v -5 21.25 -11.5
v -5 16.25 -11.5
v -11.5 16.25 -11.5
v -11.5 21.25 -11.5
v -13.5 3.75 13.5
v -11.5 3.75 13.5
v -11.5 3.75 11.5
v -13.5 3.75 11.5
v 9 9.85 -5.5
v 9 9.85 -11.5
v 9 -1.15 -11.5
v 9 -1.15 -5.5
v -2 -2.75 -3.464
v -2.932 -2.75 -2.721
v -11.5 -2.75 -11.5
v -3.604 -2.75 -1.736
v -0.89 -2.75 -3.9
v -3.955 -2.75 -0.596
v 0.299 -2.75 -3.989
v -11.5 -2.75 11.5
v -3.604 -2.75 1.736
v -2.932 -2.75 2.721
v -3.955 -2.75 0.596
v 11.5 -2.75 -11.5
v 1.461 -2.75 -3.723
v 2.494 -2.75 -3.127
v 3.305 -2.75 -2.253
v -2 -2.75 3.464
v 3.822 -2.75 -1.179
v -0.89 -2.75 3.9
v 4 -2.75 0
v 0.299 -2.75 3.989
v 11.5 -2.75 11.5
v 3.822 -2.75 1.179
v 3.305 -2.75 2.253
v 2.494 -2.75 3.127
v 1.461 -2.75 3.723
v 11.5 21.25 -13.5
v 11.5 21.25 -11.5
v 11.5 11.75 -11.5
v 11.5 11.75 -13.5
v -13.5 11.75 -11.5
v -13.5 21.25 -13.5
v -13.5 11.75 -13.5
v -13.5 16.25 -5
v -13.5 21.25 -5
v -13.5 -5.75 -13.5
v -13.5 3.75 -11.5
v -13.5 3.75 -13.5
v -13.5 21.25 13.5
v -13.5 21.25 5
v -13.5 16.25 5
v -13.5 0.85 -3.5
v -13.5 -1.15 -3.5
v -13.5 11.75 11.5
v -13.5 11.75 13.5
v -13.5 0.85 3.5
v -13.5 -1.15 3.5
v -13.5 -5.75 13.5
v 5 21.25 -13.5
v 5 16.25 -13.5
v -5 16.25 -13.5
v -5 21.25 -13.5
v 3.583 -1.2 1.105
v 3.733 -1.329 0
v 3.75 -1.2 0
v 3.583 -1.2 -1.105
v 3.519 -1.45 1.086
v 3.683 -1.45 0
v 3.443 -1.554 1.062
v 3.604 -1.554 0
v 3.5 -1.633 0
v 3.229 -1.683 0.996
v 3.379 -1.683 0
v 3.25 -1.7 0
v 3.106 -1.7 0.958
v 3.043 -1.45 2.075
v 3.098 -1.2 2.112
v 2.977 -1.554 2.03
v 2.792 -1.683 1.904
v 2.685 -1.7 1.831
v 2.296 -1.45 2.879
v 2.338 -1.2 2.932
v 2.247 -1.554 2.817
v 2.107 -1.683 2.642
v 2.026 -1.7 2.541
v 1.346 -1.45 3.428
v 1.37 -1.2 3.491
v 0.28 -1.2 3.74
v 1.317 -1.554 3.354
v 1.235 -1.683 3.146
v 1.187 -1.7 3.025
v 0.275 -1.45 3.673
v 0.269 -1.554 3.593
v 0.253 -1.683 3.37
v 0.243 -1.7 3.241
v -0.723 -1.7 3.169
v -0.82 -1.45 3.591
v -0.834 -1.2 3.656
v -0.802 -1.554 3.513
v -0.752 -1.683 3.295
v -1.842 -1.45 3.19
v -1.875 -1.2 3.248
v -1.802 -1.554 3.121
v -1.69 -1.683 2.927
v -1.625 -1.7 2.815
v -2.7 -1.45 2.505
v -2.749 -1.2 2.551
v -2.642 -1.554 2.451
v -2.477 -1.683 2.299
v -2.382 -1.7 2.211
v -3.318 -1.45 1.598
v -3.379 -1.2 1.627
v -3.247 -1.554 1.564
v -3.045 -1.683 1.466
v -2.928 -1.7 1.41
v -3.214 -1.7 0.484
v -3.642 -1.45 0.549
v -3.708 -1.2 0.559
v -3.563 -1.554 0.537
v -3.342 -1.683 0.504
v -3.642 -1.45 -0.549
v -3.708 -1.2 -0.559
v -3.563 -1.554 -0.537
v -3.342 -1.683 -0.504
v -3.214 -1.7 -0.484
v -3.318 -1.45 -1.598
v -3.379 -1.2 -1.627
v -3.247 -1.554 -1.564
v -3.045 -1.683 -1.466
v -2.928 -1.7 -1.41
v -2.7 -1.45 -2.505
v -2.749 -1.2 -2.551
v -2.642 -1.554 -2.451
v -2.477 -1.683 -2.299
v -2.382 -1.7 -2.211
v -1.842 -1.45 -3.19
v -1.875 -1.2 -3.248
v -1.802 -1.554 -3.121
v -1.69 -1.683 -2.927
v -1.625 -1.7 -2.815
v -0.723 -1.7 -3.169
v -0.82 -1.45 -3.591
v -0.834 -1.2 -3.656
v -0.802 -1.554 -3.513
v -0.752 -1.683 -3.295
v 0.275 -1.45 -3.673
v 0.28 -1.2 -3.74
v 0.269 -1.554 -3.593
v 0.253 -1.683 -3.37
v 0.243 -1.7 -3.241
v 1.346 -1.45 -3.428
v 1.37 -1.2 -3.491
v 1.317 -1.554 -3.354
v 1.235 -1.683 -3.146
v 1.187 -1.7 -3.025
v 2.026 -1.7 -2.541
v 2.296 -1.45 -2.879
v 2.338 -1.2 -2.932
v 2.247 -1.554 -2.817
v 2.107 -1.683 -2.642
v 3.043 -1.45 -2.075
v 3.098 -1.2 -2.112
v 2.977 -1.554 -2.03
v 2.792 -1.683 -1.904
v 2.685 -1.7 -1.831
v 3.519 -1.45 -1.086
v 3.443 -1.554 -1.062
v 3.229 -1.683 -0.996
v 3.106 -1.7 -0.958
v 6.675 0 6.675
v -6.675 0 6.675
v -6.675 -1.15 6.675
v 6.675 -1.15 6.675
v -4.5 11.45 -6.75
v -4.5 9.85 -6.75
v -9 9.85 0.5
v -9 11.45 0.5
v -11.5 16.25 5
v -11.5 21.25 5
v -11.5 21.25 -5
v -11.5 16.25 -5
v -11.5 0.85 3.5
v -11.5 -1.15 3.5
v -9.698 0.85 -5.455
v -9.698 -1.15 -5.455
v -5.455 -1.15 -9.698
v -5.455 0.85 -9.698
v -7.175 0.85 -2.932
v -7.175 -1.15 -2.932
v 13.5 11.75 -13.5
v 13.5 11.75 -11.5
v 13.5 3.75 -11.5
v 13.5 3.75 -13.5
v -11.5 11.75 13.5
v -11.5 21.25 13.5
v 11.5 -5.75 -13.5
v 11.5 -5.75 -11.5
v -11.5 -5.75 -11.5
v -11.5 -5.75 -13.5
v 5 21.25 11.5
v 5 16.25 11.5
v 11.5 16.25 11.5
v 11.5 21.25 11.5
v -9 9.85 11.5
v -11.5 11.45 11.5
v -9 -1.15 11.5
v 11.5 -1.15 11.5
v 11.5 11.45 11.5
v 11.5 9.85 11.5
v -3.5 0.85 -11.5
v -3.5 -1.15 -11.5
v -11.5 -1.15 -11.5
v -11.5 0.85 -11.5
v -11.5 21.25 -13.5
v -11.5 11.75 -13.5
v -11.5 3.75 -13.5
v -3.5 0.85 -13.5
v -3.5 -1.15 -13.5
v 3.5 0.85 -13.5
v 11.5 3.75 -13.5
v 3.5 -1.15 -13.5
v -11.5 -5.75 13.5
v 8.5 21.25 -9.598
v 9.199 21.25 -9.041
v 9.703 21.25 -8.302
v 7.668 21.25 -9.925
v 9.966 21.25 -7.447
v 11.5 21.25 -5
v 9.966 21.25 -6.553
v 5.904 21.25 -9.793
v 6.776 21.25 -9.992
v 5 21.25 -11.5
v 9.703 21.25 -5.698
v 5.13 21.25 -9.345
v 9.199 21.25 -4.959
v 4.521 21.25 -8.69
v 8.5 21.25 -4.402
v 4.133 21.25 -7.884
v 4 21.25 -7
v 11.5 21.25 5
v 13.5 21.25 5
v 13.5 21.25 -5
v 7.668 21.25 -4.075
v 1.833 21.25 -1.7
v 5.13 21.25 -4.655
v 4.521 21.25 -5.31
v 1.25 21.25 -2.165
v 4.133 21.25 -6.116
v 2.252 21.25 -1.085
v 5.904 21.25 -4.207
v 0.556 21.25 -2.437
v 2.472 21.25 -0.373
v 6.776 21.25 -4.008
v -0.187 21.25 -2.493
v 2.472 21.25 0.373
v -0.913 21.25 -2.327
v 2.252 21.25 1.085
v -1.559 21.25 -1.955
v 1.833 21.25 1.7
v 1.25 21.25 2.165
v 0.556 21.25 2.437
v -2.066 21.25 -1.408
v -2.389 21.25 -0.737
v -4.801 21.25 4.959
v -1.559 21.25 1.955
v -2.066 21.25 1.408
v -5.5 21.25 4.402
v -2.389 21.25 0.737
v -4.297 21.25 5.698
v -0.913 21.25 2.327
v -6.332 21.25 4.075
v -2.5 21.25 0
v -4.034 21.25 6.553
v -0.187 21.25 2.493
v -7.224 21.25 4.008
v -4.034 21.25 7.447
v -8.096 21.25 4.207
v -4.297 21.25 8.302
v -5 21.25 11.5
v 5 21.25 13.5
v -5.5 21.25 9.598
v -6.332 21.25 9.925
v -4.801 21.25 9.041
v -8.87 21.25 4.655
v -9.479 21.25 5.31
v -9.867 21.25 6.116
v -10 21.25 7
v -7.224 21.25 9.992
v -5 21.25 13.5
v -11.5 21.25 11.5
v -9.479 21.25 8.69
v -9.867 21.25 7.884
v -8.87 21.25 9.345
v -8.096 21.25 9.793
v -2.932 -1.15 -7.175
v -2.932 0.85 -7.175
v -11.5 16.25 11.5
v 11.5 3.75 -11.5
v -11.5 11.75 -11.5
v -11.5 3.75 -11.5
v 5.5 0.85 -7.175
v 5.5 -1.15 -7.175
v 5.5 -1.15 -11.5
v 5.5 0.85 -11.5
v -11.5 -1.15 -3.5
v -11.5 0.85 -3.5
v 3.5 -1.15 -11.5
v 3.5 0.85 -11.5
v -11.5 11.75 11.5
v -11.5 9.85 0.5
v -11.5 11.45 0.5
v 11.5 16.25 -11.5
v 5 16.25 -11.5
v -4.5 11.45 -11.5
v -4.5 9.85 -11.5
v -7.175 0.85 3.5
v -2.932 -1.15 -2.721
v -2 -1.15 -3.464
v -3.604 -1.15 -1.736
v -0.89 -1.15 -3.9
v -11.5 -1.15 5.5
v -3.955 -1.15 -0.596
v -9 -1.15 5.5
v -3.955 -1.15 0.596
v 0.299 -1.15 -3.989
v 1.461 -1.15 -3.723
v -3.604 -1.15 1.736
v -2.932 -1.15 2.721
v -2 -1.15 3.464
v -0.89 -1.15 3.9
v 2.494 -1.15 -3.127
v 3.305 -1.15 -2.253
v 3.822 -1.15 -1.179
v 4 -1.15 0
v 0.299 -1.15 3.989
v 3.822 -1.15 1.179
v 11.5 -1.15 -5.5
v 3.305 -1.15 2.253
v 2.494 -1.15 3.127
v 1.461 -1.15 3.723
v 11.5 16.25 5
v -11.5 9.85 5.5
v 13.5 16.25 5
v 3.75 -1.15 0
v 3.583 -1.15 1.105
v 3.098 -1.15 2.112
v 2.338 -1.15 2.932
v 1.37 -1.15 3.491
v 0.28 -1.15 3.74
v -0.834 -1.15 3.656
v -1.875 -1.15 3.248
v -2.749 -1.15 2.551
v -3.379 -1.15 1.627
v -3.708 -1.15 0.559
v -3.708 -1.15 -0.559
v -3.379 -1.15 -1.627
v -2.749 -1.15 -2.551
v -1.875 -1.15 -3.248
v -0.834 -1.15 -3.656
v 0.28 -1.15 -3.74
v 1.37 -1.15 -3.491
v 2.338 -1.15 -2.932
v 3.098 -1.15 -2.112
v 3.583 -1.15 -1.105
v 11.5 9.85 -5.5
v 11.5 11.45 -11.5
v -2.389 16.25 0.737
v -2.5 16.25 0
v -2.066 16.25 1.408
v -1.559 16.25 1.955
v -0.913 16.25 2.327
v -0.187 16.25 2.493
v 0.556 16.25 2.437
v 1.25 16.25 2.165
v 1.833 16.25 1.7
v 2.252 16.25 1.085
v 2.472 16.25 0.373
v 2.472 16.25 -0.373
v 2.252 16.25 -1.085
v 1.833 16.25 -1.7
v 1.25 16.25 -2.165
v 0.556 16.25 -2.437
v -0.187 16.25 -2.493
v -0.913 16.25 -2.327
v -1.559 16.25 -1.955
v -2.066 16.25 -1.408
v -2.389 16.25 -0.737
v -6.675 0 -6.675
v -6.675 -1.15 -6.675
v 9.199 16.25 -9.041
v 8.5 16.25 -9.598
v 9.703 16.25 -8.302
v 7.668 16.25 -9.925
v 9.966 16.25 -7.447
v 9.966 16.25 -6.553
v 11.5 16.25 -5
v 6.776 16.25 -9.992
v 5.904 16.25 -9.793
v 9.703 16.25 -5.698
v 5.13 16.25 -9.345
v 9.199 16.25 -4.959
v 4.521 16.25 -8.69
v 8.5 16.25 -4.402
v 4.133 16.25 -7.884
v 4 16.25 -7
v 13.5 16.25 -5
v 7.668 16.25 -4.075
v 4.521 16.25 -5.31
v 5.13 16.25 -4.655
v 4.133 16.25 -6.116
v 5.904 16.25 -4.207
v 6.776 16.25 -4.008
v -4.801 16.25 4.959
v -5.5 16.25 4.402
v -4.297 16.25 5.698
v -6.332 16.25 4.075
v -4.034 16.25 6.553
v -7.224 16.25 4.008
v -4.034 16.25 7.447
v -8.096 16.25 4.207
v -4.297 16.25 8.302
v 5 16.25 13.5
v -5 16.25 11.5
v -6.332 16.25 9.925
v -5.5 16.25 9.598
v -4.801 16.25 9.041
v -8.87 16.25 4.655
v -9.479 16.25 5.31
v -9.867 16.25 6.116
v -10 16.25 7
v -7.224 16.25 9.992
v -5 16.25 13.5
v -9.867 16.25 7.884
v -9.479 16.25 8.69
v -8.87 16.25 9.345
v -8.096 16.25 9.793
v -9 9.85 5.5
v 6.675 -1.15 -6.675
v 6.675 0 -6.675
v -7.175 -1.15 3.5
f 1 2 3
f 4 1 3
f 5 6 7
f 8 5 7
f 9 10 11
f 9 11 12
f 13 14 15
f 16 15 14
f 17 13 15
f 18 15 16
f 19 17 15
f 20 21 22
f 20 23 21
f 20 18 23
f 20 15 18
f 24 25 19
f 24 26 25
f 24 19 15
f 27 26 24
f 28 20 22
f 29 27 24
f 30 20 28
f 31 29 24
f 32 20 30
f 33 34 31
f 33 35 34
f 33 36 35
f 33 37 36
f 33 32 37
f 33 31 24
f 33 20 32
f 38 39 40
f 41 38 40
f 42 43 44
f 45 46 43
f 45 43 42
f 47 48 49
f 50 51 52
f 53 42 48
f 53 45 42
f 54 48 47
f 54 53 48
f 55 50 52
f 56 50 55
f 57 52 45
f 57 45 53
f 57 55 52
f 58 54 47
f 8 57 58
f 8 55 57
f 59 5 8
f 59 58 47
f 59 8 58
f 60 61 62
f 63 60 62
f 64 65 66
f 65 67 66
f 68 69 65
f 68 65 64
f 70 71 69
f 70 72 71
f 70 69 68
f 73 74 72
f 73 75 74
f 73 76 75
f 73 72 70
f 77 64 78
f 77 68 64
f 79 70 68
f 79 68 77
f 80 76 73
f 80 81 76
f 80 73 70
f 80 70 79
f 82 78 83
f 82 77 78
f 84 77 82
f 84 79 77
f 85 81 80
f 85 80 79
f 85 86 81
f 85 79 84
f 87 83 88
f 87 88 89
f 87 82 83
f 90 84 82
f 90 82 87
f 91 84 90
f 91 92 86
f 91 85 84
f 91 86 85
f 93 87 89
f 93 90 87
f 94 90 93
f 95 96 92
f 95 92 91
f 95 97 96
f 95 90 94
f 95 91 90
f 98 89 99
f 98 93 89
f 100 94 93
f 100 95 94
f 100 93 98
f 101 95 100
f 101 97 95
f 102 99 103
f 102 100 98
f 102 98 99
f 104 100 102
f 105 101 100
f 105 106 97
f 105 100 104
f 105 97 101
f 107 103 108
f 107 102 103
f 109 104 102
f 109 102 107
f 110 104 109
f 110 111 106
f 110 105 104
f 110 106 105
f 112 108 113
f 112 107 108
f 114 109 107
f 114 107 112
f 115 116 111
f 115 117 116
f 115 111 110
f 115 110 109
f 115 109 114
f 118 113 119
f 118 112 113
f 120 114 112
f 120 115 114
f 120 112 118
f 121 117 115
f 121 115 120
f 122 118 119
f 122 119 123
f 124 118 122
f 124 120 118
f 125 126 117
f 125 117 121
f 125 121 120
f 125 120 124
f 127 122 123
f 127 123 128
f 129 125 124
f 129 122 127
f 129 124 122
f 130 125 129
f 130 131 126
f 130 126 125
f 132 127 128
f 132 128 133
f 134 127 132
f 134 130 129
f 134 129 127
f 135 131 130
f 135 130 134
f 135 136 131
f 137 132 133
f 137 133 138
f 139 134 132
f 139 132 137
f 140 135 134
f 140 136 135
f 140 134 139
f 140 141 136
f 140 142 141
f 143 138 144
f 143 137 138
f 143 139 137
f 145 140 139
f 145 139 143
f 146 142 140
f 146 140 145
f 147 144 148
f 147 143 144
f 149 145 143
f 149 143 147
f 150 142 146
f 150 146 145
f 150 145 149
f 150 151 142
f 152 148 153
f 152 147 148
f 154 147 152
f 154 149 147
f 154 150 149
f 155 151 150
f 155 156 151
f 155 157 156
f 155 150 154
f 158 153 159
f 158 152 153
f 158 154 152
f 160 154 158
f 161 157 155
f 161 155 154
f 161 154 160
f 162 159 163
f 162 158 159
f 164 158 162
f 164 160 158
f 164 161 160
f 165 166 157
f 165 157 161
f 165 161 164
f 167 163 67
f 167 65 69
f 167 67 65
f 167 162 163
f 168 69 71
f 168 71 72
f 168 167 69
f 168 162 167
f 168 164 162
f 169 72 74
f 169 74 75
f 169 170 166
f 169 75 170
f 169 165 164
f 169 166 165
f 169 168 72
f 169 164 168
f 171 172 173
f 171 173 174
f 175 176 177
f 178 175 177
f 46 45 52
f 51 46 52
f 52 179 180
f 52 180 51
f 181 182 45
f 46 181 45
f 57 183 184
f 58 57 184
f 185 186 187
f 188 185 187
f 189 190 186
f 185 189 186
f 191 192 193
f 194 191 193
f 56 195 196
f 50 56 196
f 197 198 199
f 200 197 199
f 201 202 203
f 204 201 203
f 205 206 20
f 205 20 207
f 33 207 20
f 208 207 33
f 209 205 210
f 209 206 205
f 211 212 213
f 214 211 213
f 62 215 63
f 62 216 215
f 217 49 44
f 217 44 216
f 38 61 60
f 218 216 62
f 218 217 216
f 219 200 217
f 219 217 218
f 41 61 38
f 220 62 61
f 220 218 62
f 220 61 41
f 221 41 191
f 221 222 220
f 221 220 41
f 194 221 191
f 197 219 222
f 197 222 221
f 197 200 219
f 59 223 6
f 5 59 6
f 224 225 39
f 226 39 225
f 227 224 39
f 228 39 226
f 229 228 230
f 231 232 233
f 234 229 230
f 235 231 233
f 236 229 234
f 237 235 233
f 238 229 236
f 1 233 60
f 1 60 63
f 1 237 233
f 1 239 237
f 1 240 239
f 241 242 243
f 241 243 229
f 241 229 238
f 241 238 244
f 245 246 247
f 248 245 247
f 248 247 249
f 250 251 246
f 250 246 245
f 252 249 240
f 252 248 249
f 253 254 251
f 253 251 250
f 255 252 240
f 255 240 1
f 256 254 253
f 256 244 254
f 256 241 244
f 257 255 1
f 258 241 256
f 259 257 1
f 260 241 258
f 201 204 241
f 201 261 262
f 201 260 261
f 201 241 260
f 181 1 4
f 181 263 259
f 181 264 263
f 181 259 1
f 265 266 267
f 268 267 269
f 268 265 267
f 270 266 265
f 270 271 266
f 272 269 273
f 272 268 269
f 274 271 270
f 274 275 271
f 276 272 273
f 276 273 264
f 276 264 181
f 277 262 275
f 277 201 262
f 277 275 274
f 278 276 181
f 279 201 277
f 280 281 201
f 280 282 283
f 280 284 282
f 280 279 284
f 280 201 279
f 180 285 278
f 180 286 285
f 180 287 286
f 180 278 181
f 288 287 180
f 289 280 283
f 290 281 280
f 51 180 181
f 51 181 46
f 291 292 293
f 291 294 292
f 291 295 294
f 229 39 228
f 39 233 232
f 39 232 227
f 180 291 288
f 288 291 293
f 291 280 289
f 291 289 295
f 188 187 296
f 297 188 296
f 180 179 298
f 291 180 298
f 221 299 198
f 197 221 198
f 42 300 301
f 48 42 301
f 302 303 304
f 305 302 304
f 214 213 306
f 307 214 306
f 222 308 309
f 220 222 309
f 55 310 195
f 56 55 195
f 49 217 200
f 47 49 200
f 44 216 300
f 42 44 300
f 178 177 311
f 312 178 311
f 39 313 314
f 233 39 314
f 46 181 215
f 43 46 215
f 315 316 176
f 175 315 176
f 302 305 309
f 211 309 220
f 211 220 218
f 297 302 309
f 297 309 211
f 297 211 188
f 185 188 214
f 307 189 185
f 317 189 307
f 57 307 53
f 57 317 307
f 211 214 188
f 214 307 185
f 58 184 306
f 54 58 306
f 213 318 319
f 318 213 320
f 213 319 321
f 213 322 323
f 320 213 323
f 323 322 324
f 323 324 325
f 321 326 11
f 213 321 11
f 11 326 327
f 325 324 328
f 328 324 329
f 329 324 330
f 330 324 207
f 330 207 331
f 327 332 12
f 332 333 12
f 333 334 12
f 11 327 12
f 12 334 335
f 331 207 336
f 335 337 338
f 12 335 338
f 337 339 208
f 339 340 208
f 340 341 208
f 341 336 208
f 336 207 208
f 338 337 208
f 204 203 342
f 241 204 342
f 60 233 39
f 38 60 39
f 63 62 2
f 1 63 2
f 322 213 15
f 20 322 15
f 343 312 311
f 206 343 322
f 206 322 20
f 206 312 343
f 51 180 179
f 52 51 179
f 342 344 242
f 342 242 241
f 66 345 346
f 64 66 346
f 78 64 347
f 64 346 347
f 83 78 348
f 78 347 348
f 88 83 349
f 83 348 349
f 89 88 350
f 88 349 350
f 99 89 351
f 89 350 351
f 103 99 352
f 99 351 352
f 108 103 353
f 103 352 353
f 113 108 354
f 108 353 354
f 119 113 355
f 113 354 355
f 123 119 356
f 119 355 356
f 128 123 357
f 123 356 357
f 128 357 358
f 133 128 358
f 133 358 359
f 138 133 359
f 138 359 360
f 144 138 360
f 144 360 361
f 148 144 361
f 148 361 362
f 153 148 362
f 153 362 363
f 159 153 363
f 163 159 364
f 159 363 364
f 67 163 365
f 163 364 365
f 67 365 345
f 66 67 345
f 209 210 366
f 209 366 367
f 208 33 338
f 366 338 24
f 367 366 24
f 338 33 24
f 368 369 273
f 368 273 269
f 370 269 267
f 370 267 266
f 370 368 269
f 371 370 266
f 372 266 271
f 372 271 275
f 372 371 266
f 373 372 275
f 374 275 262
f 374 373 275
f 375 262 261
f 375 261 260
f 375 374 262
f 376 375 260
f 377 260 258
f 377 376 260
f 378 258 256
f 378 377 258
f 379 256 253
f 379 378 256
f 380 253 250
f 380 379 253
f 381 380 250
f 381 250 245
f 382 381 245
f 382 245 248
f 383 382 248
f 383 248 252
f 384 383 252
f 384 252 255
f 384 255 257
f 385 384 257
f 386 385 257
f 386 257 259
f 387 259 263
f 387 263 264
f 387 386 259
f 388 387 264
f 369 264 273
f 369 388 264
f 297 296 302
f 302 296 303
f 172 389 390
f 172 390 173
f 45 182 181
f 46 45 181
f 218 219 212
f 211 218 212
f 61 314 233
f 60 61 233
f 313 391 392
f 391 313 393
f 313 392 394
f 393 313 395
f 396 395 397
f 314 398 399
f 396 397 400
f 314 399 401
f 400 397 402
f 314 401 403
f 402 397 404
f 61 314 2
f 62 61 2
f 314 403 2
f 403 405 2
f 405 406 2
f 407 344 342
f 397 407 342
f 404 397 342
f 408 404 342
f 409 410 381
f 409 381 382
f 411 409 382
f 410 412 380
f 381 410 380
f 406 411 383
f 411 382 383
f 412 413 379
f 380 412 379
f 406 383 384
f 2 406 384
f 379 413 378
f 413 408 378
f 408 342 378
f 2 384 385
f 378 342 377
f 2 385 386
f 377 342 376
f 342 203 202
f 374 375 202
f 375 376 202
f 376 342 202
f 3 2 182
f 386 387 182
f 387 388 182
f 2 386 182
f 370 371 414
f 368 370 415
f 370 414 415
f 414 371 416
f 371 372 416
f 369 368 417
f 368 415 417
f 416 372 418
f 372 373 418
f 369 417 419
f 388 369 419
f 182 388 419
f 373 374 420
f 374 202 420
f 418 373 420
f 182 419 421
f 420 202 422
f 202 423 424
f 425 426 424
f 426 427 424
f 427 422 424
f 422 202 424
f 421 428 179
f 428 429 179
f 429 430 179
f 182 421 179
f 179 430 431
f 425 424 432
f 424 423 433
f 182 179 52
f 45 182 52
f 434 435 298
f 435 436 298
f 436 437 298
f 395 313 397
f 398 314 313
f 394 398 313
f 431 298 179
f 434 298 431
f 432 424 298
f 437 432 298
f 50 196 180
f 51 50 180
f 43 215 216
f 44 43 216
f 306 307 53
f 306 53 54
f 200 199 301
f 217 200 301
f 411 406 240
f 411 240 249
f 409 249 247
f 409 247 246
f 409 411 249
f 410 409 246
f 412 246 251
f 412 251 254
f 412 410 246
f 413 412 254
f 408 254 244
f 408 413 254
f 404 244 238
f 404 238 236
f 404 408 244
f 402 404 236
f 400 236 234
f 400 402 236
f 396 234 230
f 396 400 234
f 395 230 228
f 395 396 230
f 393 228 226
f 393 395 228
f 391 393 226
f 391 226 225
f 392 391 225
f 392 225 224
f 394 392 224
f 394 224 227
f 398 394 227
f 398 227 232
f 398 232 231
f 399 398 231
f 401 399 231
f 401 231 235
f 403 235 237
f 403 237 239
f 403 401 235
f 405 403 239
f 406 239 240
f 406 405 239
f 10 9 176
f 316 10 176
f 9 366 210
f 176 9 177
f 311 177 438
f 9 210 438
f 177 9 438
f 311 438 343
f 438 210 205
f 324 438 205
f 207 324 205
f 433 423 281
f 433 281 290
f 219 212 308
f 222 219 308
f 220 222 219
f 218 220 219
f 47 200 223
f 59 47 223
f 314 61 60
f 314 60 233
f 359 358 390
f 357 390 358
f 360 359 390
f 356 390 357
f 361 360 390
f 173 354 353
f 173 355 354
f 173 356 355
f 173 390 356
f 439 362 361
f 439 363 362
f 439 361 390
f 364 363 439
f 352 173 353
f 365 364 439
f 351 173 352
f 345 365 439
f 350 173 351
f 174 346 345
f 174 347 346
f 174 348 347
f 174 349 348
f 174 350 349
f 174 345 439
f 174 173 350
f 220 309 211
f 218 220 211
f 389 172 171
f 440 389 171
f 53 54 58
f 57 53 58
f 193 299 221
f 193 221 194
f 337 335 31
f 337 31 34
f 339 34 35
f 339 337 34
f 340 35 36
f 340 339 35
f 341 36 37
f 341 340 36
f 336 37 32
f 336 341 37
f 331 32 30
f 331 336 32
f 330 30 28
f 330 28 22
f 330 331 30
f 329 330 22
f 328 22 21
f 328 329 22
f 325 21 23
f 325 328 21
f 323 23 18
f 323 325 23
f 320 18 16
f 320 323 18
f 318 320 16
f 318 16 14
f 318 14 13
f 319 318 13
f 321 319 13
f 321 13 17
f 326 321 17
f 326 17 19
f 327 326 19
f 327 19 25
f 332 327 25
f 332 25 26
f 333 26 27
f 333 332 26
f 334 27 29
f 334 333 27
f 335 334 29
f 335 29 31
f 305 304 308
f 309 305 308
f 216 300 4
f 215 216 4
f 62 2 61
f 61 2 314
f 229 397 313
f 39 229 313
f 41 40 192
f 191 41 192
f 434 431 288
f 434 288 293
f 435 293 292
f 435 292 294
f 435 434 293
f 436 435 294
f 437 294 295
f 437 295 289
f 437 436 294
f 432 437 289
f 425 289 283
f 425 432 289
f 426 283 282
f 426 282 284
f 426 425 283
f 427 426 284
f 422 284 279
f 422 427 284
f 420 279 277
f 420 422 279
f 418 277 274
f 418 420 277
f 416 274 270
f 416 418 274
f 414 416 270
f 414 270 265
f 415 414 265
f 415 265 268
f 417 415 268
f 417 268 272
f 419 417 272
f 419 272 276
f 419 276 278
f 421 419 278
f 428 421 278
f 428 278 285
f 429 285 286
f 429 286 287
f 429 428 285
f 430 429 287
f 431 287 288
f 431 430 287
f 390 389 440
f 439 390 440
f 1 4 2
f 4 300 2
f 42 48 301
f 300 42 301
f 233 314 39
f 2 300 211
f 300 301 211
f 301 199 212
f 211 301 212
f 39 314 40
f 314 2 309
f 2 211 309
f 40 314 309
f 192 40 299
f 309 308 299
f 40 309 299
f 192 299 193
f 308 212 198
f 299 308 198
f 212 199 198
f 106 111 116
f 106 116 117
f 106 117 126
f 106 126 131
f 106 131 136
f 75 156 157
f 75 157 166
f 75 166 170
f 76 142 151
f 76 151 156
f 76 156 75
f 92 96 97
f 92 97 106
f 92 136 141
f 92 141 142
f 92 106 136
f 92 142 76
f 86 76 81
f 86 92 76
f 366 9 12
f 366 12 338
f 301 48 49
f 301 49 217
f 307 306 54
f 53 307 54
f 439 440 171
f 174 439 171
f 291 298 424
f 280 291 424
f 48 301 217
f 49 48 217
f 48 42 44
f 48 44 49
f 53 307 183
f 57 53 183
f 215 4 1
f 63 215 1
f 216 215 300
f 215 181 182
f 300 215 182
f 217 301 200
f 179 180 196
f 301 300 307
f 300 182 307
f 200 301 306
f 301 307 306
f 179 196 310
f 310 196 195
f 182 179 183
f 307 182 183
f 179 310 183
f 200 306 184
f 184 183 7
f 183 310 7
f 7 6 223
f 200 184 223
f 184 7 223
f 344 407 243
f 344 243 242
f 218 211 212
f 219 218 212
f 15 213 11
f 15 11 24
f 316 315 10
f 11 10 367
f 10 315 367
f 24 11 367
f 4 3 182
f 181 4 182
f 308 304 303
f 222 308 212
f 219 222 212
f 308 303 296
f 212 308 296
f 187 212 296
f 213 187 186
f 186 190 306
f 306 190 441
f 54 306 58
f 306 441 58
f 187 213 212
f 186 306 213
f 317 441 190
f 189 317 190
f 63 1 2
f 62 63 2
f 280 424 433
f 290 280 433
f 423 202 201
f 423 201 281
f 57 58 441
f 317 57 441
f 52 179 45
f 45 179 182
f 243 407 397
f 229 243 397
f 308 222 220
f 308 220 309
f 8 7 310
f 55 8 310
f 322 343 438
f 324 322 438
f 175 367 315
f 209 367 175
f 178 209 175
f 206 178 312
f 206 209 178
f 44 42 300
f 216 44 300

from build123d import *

# Parameters (mm, degrees)
F0_W      = 13.35
F0_H      = 13.35
F1_DEPTH  = 1.15
F2_R      = 3.75
F3_DEPTH  = 0.55
F4_R      = 0.5
F5_W      = 23
F5_H      = 23
F5_R      = 4
F6_DEPTH  = 1.6
F9_DEPTH  = 1.6
F10_W     = 2.5
F10_H     = 6
F11_DEPTH = 11
F12_W     = 2
F12_H     = 7
F12_W_2   = 7
F12_H_2   = 2
F13_DEPTH = 2
F14_W     = 8
F14_H     = 2
F14_W_2   = 2
F14_H_2   = 8
F15_DEPTH = 2
F16_W     = 2
F16_H     = 8
F17_DEPTH = 2
F18_R     = 3
F18_R_2   = 2.5
F18_W     = 2
F18_H     = 10
F18_W_2   = 10
F18_H_2   = 2
F19_DEPTH = 5


with BuildPart() as f1:
    # F0 (on Front) → F1 (new body)
    with BuildSketch(Plane.XZ):
        Rectangle(F0_W, F0_H)
    extrude(amount=F1_DEPTH)

    # F2 (on face) → F3 (join)
    with BuildSketch(Plane.XZ.offset(1.15)):
        Circle(F2_R)
    extrude(amount=F3_DEPTH)

    # F4
    f4_edges = [f1.edges().sort_by_distance(p)[0] for p in [
        (-3.75, -1.7, 0),
    ]]
    fillet(f4_edges, radius=F4_R)


with BuildPart() as f6:
    # F5 (on face) → F6 (new body)
    with BuildSketch(Plane.XZ.offset(1.15)):
        Rectangle(F5_W, F5_H)
        Circle(F5_R, mode=Mode.SUBTRACT)
    extrude(amount=F6_DEPTH)



with BuildPart() as f9:
    # F8 (on offset) → F9 (new body)
    with BuildSketch(Plane(origin=(0, 9.85, 0), x_dir=(-1, 0, 0), z_dir=(0, 1, 0))):
        Polygon((11.5, 0.5), (11.5, 11.5), (-11.5, 11.5), (-11.5, -11.5), (4.5, -11.5), (4.5, -6.75), (9, 0.5), align=None)
    extrude(amount=F9_DEPTH)


with BuildPart() as f6_1:
    add(f6.part)

    add(f9.part)  # F11 merges F9
    # F10 (on face) → F11 (join, through all)
    with BuildSketch(Plane.XZ.offset(-9.85)):
        with Locations((-10.25, 8.5)):
            Rectangle(F10_W, F10_H)
        with Locations((10.25, -8.5)):
            Rectangle(F10_W, F10_H)
    extrude(amount=F11_DEPTH)


with BuildPart() as f13:
    # F12 (on face) → F13 (new body)
    with BuildSketch(Plane(origin=(0, -1.15, 0), x_dir=(-1, 0, 0), z_dir=(0, 1, 0))):
        with Locations((12.5, 0)):
            Rectangle(F12_W, F12_H)
        Polygon((11.5, -11.5), (11.5, -3.5), (11.5, 3.5), (7.175, 3.5), (7.175, -2.9323593129), (9.6976406871, -5.455), (5.455, -9.6976406871), (2.9323593129, -7.175), (-5.5, -7.175), (-5.5, -11.5), (-3.5, -11.5), (3.5, -11.5), align=None)
        with Locations((0, -12.5)):
            Rectangle(F12_W_2, F12_H_2)
    extrude(amount=F13_DEPTH)


with BuildPart() as f15:
    # F14 (on face) → F15 (new body)
    with BuildSketch(Plane(origin=(0, 0, -11.5), x_dir=(1, 0, 0), z_dir=(0, 0, -1))):
        with Locations((-7.5, 0.15)):
            Rectangle(F14_W, F14_H)
        Polygon((11.5, 5.75), (-11.5, 5.75), (-11.5, 1.15), (-3.5, 1.15), (3.5, 1.15), (3.5, -0.85), (-3.5, -0.85), (-11.5, -0.85), (-11.5, -3.75), (-11.5, -11.75), (-11.5, -21.25), (-5, -21.25), (-5, -16.25), (5, -16.25), (5, -21.25), (11.5, -21.25), (11.5, -11.75), (11.5, -3.75), align=None)
        with Locations((-12.5, -7.75)):
            Rectangle(F14_W_2, F14_H_2)
        with Locations((12.5, -7.75)):
            Rectangle(F14_W_2, F14_H_2)
    extrude(amount=F15_DEPTH)


with BuildPart() as f17:
    # F16 (on face) → F17 (new body)
    with BuildSketch(Plane(origin=(-11.5, 0, 0), x_dir=(0, -1, 0), z_dir=(-1, 0, 0))):
        Polygon((-3.75, -13.5), (5.75, -13.5), (5.75, 13.5), (-3.75, 13.5), (-3.75, 11.5), (-11.75, 11.5), (-11.75, 13.5), (-21.25, 13.5), (-21.25, 5), (-16.25, 5), (-16.25, -5), (-21.25, -5), (-21.25, -13.5), (-11.75, -13.5), (-11.75, -11.5), (-3.75, -11.5), align=None)
        Polygon((1.15, 3.5), (1.15, -3.5), (1.15, -11.5), (-0.85, -11.5), (-0.85, -3.5), (-0.85, 3.5), align=None, mode=Mode.SUBTRACT)
        with Locations((0.15, -7.5)):
            Rectangle(F16_W, F16_H)
    extrude(amount=F17_DEPTH)


with BuildPart() as f19:
    # F18 (on face) → F19 (new body)
    with BuildSketch(Plane(origin=(0, 16.25, 0), x_dir=(-1, 0, 0), z_dir=(0, 1, 0))):
        Polygon((-5, 11.5), (-11.5, 11.5), (-11.5, 5), (-11.5, -5), (-11.5, -11.5), (-5, -11.5), (5, -11.5), (11.5, -11.5), (11.5, -5), (11.5, 5), (11.5, 11.5), (5, 11.5), align=None)
        with Locations((-7, -7)):
            Circle(F18_R, mode=Mode.SUBTRACT)
        Circle(F18_R_2, mode=Mode.SUBTRACT)
        with Locations((7, 7)):
            Circle(F18_R, mode=Mode.SUBTRACT)
        with Locations((-12.5, 0)):
            Rectangle(F18_W, F18_H)
        with Locations((0, -12.5)):
            Rectangle(F18_W_2, F18_H_2)
        with Locations((0, 12.5)):
            Rectangle(F18_W_2, F18_H_2)
        with Locations((12.5, 0)):
            Rectangle(F18_W, F18_H)
    extrude(amount=F19_DEPTH)


solid = Compound([f1.part, f6_1.part, f13.part, f15.part, f17.part, f19.part])
